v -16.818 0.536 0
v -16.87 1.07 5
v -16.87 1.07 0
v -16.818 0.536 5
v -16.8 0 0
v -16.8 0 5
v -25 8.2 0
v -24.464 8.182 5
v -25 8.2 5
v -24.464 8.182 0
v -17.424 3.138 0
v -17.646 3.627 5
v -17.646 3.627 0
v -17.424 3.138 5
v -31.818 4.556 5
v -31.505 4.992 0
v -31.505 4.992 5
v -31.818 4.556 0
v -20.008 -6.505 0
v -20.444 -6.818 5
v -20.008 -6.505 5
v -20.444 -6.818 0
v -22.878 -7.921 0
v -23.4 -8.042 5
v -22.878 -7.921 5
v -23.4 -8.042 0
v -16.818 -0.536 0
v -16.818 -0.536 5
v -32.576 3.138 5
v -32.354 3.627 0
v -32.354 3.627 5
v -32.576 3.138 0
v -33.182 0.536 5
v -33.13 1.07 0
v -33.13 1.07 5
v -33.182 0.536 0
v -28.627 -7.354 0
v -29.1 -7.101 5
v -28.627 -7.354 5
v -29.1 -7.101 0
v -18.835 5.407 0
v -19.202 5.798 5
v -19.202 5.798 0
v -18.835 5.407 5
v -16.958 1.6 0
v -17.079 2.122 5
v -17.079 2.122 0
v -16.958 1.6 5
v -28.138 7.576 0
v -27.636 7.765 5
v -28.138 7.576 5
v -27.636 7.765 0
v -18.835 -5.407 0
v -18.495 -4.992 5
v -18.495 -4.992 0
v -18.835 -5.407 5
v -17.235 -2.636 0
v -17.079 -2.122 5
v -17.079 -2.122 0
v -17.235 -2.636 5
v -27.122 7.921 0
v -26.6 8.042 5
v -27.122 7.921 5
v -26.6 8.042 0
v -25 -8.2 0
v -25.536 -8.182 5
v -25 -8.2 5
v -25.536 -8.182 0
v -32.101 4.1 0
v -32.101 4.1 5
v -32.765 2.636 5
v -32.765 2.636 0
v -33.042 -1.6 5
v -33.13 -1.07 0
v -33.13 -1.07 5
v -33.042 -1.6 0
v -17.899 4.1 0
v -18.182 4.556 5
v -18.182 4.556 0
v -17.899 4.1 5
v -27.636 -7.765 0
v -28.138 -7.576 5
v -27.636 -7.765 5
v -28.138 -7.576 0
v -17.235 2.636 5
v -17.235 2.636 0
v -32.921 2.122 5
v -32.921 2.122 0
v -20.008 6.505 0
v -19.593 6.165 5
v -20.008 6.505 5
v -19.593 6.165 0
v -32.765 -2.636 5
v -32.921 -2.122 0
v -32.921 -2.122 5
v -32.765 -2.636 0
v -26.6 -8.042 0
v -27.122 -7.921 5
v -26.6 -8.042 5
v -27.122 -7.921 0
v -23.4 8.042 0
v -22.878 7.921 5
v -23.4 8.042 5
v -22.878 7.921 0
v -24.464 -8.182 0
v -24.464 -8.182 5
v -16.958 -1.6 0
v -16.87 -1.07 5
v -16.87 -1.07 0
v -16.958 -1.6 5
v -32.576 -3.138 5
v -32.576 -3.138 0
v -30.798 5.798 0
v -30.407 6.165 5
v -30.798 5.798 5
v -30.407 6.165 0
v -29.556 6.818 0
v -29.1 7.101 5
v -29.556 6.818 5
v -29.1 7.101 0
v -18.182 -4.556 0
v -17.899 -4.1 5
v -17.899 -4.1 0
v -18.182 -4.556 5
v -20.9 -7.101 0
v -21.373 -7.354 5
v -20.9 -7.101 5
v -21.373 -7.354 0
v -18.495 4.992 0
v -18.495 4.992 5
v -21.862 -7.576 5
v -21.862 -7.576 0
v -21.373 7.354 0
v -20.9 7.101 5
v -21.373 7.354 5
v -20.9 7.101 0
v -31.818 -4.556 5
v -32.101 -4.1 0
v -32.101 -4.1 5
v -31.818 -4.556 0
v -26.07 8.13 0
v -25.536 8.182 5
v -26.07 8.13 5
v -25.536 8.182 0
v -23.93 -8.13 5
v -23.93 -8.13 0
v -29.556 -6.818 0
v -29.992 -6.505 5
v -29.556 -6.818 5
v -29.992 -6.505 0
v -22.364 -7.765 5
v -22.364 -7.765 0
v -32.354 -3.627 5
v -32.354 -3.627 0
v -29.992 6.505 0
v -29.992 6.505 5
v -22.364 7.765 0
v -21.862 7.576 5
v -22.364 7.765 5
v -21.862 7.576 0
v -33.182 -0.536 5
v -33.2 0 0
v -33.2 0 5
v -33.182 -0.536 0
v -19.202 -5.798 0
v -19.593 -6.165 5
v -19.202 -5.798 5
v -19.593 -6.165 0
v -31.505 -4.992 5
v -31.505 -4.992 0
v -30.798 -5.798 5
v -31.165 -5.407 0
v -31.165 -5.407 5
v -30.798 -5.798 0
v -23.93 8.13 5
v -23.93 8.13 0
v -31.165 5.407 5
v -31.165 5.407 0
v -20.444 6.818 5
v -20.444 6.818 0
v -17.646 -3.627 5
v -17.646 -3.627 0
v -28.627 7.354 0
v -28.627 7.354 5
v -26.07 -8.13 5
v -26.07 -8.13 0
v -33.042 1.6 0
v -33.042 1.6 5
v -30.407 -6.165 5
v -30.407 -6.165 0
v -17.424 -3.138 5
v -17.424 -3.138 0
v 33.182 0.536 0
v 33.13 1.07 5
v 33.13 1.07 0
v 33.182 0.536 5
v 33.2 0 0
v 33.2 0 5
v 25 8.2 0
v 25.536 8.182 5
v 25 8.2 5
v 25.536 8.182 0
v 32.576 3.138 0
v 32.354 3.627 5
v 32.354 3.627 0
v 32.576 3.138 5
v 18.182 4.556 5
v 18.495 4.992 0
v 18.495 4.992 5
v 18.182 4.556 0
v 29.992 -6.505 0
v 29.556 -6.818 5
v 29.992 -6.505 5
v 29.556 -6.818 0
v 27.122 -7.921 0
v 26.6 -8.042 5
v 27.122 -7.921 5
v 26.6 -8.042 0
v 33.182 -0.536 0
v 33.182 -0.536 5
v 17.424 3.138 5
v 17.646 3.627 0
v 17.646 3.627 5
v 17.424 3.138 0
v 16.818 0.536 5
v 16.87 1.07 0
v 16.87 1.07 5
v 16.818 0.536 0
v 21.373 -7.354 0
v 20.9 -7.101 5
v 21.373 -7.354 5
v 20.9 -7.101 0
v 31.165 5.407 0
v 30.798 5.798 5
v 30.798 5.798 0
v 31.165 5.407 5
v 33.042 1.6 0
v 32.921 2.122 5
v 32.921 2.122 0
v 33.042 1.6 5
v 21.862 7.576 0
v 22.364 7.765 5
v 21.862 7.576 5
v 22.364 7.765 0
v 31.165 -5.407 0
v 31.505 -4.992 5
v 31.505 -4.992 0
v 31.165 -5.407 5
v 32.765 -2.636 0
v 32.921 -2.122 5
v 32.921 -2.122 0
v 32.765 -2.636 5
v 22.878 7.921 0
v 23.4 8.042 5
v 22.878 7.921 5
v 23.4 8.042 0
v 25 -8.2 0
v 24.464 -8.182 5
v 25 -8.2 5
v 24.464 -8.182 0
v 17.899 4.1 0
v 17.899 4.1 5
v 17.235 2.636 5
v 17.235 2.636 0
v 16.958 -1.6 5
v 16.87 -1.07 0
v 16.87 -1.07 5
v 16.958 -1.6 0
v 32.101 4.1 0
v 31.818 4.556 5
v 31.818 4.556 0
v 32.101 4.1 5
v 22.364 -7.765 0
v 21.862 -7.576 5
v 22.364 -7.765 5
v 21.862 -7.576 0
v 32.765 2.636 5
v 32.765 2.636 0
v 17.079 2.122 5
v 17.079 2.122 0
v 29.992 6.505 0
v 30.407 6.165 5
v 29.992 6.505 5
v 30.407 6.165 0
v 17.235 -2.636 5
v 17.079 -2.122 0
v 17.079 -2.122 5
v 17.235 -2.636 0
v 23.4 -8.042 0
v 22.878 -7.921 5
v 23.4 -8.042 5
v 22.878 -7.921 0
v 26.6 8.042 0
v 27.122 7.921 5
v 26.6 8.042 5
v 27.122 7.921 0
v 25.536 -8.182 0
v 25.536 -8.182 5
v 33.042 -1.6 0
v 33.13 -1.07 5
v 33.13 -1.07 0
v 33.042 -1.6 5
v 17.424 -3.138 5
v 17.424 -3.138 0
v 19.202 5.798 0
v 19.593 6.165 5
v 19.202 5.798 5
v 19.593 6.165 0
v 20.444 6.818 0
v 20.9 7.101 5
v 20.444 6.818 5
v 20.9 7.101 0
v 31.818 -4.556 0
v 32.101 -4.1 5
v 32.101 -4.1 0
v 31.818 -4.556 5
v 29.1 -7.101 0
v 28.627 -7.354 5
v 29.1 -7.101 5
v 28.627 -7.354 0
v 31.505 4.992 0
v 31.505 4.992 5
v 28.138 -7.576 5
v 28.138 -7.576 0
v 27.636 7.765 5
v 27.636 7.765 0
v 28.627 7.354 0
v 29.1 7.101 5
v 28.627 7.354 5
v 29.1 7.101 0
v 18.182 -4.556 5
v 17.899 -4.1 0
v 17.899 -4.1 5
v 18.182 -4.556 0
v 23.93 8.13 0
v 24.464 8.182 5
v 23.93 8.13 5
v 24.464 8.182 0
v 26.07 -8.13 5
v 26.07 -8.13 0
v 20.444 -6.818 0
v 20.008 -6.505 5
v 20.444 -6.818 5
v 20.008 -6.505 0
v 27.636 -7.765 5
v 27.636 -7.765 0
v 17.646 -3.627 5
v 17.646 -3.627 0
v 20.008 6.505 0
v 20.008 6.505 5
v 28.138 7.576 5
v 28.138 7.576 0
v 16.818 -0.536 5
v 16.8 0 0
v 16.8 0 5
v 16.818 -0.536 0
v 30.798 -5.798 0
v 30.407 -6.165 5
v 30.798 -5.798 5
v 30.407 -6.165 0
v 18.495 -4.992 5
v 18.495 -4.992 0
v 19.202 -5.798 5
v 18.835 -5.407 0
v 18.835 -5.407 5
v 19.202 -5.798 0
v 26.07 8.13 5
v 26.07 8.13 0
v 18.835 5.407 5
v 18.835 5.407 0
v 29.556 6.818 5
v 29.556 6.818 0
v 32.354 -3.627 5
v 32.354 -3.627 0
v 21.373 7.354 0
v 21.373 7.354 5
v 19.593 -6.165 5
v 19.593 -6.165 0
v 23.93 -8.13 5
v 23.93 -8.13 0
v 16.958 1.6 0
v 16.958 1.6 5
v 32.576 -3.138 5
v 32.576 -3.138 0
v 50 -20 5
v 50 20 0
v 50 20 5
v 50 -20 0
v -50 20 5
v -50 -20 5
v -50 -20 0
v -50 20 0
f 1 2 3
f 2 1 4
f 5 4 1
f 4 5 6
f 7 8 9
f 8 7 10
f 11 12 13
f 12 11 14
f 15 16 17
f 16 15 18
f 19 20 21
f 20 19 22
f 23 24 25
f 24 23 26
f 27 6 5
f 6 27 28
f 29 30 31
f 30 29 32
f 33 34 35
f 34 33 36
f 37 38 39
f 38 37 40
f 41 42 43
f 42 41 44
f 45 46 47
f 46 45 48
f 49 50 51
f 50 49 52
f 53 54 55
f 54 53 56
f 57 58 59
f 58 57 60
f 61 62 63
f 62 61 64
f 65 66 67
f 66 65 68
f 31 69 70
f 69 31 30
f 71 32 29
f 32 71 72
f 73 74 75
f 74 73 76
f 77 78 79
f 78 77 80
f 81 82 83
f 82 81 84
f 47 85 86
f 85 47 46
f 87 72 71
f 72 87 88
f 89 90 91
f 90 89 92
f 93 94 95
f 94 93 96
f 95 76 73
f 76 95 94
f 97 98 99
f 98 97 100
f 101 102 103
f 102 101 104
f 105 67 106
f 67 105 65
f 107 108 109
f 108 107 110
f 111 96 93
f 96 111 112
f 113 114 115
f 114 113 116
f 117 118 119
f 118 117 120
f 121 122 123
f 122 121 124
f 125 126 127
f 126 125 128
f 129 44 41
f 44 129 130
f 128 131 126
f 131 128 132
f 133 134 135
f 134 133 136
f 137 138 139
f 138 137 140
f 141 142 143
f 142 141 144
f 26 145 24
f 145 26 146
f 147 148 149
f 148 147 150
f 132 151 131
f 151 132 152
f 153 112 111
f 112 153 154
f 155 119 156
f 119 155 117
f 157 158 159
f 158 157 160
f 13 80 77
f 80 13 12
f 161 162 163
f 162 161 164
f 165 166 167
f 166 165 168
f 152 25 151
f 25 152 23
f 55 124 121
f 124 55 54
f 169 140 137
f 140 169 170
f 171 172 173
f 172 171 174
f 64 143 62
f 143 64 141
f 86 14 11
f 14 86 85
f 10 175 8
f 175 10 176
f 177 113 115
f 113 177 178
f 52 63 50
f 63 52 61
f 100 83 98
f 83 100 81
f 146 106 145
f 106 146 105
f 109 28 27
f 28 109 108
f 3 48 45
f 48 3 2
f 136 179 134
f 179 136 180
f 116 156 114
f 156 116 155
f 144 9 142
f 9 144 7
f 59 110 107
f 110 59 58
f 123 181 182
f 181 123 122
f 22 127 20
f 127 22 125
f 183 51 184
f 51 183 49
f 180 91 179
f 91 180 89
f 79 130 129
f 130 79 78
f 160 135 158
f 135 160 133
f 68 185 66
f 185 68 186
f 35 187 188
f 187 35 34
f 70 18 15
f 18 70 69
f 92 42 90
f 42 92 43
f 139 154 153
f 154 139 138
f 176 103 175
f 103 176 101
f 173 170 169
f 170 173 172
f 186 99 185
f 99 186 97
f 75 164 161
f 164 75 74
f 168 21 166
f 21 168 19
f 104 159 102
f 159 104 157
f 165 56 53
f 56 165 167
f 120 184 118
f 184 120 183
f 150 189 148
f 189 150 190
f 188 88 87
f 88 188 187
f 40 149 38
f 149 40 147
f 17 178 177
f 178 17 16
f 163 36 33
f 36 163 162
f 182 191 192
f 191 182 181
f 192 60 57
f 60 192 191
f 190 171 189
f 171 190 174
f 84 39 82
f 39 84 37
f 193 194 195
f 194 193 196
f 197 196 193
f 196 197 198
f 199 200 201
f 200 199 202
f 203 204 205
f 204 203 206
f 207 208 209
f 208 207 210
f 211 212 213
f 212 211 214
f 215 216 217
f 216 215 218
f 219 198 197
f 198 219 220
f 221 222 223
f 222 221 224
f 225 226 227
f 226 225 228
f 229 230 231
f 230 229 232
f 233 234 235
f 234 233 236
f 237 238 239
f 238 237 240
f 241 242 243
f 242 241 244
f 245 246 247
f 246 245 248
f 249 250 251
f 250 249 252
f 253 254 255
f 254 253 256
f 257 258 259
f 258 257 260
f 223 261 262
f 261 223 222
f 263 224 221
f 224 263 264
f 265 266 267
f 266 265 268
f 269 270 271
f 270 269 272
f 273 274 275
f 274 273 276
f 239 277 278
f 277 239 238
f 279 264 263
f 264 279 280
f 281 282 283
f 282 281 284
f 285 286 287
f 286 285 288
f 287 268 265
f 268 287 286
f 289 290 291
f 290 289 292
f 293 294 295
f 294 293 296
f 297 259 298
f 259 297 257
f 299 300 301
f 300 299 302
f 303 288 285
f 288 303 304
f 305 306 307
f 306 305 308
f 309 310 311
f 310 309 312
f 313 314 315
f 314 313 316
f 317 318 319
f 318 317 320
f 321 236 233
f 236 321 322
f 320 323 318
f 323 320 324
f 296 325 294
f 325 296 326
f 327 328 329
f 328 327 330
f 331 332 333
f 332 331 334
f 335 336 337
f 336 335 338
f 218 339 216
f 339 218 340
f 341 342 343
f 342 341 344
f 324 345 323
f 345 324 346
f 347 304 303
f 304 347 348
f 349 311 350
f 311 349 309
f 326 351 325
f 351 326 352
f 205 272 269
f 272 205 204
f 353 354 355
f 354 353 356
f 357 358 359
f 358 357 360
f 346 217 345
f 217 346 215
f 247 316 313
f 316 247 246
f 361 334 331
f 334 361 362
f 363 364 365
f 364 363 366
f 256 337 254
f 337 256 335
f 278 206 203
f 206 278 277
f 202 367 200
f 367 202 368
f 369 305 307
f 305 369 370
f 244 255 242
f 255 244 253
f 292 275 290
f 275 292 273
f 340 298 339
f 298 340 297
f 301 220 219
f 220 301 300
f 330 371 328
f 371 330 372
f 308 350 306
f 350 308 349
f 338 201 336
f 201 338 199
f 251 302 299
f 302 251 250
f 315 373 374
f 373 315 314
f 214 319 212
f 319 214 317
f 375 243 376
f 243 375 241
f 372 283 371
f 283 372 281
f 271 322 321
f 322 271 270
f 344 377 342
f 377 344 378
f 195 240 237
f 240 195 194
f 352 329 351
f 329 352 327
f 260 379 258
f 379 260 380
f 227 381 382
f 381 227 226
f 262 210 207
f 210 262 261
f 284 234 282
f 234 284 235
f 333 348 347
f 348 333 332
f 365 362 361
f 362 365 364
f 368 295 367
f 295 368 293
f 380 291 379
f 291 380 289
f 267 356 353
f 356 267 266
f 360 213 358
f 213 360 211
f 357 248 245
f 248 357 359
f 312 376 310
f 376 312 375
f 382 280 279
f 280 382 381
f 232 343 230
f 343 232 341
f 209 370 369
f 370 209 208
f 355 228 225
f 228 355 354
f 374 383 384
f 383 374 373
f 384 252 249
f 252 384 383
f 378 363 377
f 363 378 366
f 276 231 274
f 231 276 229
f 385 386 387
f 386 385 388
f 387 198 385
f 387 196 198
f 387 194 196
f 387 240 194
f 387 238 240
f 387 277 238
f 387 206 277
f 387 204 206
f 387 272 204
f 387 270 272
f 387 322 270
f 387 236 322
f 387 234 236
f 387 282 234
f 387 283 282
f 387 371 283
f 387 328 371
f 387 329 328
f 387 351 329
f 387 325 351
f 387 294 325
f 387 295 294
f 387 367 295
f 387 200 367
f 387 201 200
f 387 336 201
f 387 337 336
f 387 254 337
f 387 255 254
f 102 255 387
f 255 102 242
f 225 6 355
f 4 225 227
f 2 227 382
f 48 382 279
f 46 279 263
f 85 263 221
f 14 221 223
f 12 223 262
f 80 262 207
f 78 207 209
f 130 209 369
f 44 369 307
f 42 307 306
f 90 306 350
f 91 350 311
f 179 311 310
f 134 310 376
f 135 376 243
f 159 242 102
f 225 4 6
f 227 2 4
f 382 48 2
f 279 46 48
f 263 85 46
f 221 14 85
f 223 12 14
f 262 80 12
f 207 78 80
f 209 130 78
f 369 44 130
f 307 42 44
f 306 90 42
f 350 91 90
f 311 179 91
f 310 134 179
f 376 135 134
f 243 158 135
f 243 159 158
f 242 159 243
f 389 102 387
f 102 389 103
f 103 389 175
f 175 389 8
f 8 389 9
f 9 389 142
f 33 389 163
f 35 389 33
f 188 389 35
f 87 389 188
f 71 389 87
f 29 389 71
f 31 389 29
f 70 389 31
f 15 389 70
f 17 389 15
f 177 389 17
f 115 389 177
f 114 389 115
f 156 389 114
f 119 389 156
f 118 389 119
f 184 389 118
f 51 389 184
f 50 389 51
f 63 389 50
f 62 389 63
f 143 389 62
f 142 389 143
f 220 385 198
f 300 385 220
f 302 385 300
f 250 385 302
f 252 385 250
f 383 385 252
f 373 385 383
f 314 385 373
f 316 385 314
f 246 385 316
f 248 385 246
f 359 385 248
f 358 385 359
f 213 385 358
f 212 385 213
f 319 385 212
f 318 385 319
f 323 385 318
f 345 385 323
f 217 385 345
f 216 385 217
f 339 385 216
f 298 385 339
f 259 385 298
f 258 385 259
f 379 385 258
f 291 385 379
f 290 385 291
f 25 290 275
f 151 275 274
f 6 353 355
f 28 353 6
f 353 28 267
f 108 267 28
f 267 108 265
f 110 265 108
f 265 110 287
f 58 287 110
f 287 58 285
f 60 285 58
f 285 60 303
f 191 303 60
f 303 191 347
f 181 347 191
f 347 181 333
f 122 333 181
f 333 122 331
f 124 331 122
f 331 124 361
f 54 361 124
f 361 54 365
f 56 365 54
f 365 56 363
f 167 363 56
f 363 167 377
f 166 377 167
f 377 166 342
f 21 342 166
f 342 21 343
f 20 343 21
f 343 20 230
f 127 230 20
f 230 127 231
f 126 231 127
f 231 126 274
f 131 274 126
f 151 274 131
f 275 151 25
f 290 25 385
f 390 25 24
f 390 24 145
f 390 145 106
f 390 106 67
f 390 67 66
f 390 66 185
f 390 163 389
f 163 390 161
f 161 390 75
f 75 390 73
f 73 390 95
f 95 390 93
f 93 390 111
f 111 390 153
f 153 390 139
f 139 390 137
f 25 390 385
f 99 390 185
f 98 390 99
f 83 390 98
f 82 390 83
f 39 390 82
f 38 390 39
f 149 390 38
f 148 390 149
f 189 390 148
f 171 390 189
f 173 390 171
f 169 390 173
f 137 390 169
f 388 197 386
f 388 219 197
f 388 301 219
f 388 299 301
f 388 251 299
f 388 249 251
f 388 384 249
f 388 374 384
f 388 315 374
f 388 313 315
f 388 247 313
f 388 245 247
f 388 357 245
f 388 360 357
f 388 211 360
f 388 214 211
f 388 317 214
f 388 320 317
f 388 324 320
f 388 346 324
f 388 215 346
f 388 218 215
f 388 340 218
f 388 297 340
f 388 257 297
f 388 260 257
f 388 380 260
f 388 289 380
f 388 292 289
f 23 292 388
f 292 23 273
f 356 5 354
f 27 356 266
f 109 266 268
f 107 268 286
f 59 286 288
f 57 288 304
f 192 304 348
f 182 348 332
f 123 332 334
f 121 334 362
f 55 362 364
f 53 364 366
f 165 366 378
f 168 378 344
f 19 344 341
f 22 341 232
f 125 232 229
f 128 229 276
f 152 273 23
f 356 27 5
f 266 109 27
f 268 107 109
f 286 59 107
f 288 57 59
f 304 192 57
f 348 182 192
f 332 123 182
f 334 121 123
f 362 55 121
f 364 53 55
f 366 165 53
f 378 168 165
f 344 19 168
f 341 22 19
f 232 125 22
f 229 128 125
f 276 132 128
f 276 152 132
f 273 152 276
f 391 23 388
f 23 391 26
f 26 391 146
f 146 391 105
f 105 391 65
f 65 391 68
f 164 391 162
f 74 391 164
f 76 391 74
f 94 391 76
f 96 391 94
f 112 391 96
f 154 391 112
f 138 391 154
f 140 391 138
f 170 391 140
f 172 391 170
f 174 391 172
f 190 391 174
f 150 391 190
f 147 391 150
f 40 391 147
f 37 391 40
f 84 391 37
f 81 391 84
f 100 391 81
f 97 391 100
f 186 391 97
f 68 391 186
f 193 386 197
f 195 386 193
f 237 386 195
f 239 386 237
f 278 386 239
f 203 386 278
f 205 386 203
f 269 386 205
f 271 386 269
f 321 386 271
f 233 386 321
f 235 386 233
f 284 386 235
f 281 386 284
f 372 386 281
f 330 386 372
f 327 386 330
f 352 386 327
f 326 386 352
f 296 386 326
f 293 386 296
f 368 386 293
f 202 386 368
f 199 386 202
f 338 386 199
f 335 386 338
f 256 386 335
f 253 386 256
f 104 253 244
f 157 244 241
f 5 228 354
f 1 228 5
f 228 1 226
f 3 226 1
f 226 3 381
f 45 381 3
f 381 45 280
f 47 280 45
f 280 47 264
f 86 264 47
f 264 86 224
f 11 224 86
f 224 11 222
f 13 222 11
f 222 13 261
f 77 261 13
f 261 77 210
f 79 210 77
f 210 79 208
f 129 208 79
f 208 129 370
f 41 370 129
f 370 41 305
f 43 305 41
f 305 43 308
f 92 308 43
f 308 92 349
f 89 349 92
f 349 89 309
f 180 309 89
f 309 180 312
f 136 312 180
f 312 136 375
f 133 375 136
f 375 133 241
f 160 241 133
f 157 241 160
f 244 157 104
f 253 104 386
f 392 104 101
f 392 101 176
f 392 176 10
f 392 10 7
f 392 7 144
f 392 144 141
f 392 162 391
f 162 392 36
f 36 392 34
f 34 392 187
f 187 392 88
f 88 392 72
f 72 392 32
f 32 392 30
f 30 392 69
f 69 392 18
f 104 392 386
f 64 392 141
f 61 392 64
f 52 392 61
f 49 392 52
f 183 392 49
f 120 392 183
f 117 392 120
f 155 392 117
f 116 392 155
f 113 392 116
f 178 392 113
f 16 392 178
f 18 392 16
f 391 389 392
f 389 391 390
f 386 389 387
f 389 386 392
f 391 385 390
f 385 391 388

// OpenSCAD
/* [Plate Dimensions] */
// Plate length
length = 100; // [40:300]
// Plate width
width = 40; // [20:150]
// Plate thickness
thickness = 5; // [2:0.5:20]

/* [Holes] */
// Hole diameter
hole_d = 16; // [3:0.5:40]
// Distance from plate end to hole center
hole_end_offset = 25; // [10:0.5:100]
// Extra radial clearance for a free fit
hole_clearance = 0.2; // [0:0.05:0.6]

/* [Quality] */
$fn = 96;

// Derived values
hole_r = hole_d / 2 + hole_clearance;
hole_x = length / 2 - hole_end_offset;

difference() {
    // Plate body, sitting on z=0, centered on origin
    translate([-length / 2, -width / 2, 0])
        cube([length, width, thickness]);

    // Two through-holes on the centerline
    for (x = [-hole_x, hole_x])
        translate([x, 0, -0.5])
            cylinder(h = thickness + 1, r = hole_r);
}
